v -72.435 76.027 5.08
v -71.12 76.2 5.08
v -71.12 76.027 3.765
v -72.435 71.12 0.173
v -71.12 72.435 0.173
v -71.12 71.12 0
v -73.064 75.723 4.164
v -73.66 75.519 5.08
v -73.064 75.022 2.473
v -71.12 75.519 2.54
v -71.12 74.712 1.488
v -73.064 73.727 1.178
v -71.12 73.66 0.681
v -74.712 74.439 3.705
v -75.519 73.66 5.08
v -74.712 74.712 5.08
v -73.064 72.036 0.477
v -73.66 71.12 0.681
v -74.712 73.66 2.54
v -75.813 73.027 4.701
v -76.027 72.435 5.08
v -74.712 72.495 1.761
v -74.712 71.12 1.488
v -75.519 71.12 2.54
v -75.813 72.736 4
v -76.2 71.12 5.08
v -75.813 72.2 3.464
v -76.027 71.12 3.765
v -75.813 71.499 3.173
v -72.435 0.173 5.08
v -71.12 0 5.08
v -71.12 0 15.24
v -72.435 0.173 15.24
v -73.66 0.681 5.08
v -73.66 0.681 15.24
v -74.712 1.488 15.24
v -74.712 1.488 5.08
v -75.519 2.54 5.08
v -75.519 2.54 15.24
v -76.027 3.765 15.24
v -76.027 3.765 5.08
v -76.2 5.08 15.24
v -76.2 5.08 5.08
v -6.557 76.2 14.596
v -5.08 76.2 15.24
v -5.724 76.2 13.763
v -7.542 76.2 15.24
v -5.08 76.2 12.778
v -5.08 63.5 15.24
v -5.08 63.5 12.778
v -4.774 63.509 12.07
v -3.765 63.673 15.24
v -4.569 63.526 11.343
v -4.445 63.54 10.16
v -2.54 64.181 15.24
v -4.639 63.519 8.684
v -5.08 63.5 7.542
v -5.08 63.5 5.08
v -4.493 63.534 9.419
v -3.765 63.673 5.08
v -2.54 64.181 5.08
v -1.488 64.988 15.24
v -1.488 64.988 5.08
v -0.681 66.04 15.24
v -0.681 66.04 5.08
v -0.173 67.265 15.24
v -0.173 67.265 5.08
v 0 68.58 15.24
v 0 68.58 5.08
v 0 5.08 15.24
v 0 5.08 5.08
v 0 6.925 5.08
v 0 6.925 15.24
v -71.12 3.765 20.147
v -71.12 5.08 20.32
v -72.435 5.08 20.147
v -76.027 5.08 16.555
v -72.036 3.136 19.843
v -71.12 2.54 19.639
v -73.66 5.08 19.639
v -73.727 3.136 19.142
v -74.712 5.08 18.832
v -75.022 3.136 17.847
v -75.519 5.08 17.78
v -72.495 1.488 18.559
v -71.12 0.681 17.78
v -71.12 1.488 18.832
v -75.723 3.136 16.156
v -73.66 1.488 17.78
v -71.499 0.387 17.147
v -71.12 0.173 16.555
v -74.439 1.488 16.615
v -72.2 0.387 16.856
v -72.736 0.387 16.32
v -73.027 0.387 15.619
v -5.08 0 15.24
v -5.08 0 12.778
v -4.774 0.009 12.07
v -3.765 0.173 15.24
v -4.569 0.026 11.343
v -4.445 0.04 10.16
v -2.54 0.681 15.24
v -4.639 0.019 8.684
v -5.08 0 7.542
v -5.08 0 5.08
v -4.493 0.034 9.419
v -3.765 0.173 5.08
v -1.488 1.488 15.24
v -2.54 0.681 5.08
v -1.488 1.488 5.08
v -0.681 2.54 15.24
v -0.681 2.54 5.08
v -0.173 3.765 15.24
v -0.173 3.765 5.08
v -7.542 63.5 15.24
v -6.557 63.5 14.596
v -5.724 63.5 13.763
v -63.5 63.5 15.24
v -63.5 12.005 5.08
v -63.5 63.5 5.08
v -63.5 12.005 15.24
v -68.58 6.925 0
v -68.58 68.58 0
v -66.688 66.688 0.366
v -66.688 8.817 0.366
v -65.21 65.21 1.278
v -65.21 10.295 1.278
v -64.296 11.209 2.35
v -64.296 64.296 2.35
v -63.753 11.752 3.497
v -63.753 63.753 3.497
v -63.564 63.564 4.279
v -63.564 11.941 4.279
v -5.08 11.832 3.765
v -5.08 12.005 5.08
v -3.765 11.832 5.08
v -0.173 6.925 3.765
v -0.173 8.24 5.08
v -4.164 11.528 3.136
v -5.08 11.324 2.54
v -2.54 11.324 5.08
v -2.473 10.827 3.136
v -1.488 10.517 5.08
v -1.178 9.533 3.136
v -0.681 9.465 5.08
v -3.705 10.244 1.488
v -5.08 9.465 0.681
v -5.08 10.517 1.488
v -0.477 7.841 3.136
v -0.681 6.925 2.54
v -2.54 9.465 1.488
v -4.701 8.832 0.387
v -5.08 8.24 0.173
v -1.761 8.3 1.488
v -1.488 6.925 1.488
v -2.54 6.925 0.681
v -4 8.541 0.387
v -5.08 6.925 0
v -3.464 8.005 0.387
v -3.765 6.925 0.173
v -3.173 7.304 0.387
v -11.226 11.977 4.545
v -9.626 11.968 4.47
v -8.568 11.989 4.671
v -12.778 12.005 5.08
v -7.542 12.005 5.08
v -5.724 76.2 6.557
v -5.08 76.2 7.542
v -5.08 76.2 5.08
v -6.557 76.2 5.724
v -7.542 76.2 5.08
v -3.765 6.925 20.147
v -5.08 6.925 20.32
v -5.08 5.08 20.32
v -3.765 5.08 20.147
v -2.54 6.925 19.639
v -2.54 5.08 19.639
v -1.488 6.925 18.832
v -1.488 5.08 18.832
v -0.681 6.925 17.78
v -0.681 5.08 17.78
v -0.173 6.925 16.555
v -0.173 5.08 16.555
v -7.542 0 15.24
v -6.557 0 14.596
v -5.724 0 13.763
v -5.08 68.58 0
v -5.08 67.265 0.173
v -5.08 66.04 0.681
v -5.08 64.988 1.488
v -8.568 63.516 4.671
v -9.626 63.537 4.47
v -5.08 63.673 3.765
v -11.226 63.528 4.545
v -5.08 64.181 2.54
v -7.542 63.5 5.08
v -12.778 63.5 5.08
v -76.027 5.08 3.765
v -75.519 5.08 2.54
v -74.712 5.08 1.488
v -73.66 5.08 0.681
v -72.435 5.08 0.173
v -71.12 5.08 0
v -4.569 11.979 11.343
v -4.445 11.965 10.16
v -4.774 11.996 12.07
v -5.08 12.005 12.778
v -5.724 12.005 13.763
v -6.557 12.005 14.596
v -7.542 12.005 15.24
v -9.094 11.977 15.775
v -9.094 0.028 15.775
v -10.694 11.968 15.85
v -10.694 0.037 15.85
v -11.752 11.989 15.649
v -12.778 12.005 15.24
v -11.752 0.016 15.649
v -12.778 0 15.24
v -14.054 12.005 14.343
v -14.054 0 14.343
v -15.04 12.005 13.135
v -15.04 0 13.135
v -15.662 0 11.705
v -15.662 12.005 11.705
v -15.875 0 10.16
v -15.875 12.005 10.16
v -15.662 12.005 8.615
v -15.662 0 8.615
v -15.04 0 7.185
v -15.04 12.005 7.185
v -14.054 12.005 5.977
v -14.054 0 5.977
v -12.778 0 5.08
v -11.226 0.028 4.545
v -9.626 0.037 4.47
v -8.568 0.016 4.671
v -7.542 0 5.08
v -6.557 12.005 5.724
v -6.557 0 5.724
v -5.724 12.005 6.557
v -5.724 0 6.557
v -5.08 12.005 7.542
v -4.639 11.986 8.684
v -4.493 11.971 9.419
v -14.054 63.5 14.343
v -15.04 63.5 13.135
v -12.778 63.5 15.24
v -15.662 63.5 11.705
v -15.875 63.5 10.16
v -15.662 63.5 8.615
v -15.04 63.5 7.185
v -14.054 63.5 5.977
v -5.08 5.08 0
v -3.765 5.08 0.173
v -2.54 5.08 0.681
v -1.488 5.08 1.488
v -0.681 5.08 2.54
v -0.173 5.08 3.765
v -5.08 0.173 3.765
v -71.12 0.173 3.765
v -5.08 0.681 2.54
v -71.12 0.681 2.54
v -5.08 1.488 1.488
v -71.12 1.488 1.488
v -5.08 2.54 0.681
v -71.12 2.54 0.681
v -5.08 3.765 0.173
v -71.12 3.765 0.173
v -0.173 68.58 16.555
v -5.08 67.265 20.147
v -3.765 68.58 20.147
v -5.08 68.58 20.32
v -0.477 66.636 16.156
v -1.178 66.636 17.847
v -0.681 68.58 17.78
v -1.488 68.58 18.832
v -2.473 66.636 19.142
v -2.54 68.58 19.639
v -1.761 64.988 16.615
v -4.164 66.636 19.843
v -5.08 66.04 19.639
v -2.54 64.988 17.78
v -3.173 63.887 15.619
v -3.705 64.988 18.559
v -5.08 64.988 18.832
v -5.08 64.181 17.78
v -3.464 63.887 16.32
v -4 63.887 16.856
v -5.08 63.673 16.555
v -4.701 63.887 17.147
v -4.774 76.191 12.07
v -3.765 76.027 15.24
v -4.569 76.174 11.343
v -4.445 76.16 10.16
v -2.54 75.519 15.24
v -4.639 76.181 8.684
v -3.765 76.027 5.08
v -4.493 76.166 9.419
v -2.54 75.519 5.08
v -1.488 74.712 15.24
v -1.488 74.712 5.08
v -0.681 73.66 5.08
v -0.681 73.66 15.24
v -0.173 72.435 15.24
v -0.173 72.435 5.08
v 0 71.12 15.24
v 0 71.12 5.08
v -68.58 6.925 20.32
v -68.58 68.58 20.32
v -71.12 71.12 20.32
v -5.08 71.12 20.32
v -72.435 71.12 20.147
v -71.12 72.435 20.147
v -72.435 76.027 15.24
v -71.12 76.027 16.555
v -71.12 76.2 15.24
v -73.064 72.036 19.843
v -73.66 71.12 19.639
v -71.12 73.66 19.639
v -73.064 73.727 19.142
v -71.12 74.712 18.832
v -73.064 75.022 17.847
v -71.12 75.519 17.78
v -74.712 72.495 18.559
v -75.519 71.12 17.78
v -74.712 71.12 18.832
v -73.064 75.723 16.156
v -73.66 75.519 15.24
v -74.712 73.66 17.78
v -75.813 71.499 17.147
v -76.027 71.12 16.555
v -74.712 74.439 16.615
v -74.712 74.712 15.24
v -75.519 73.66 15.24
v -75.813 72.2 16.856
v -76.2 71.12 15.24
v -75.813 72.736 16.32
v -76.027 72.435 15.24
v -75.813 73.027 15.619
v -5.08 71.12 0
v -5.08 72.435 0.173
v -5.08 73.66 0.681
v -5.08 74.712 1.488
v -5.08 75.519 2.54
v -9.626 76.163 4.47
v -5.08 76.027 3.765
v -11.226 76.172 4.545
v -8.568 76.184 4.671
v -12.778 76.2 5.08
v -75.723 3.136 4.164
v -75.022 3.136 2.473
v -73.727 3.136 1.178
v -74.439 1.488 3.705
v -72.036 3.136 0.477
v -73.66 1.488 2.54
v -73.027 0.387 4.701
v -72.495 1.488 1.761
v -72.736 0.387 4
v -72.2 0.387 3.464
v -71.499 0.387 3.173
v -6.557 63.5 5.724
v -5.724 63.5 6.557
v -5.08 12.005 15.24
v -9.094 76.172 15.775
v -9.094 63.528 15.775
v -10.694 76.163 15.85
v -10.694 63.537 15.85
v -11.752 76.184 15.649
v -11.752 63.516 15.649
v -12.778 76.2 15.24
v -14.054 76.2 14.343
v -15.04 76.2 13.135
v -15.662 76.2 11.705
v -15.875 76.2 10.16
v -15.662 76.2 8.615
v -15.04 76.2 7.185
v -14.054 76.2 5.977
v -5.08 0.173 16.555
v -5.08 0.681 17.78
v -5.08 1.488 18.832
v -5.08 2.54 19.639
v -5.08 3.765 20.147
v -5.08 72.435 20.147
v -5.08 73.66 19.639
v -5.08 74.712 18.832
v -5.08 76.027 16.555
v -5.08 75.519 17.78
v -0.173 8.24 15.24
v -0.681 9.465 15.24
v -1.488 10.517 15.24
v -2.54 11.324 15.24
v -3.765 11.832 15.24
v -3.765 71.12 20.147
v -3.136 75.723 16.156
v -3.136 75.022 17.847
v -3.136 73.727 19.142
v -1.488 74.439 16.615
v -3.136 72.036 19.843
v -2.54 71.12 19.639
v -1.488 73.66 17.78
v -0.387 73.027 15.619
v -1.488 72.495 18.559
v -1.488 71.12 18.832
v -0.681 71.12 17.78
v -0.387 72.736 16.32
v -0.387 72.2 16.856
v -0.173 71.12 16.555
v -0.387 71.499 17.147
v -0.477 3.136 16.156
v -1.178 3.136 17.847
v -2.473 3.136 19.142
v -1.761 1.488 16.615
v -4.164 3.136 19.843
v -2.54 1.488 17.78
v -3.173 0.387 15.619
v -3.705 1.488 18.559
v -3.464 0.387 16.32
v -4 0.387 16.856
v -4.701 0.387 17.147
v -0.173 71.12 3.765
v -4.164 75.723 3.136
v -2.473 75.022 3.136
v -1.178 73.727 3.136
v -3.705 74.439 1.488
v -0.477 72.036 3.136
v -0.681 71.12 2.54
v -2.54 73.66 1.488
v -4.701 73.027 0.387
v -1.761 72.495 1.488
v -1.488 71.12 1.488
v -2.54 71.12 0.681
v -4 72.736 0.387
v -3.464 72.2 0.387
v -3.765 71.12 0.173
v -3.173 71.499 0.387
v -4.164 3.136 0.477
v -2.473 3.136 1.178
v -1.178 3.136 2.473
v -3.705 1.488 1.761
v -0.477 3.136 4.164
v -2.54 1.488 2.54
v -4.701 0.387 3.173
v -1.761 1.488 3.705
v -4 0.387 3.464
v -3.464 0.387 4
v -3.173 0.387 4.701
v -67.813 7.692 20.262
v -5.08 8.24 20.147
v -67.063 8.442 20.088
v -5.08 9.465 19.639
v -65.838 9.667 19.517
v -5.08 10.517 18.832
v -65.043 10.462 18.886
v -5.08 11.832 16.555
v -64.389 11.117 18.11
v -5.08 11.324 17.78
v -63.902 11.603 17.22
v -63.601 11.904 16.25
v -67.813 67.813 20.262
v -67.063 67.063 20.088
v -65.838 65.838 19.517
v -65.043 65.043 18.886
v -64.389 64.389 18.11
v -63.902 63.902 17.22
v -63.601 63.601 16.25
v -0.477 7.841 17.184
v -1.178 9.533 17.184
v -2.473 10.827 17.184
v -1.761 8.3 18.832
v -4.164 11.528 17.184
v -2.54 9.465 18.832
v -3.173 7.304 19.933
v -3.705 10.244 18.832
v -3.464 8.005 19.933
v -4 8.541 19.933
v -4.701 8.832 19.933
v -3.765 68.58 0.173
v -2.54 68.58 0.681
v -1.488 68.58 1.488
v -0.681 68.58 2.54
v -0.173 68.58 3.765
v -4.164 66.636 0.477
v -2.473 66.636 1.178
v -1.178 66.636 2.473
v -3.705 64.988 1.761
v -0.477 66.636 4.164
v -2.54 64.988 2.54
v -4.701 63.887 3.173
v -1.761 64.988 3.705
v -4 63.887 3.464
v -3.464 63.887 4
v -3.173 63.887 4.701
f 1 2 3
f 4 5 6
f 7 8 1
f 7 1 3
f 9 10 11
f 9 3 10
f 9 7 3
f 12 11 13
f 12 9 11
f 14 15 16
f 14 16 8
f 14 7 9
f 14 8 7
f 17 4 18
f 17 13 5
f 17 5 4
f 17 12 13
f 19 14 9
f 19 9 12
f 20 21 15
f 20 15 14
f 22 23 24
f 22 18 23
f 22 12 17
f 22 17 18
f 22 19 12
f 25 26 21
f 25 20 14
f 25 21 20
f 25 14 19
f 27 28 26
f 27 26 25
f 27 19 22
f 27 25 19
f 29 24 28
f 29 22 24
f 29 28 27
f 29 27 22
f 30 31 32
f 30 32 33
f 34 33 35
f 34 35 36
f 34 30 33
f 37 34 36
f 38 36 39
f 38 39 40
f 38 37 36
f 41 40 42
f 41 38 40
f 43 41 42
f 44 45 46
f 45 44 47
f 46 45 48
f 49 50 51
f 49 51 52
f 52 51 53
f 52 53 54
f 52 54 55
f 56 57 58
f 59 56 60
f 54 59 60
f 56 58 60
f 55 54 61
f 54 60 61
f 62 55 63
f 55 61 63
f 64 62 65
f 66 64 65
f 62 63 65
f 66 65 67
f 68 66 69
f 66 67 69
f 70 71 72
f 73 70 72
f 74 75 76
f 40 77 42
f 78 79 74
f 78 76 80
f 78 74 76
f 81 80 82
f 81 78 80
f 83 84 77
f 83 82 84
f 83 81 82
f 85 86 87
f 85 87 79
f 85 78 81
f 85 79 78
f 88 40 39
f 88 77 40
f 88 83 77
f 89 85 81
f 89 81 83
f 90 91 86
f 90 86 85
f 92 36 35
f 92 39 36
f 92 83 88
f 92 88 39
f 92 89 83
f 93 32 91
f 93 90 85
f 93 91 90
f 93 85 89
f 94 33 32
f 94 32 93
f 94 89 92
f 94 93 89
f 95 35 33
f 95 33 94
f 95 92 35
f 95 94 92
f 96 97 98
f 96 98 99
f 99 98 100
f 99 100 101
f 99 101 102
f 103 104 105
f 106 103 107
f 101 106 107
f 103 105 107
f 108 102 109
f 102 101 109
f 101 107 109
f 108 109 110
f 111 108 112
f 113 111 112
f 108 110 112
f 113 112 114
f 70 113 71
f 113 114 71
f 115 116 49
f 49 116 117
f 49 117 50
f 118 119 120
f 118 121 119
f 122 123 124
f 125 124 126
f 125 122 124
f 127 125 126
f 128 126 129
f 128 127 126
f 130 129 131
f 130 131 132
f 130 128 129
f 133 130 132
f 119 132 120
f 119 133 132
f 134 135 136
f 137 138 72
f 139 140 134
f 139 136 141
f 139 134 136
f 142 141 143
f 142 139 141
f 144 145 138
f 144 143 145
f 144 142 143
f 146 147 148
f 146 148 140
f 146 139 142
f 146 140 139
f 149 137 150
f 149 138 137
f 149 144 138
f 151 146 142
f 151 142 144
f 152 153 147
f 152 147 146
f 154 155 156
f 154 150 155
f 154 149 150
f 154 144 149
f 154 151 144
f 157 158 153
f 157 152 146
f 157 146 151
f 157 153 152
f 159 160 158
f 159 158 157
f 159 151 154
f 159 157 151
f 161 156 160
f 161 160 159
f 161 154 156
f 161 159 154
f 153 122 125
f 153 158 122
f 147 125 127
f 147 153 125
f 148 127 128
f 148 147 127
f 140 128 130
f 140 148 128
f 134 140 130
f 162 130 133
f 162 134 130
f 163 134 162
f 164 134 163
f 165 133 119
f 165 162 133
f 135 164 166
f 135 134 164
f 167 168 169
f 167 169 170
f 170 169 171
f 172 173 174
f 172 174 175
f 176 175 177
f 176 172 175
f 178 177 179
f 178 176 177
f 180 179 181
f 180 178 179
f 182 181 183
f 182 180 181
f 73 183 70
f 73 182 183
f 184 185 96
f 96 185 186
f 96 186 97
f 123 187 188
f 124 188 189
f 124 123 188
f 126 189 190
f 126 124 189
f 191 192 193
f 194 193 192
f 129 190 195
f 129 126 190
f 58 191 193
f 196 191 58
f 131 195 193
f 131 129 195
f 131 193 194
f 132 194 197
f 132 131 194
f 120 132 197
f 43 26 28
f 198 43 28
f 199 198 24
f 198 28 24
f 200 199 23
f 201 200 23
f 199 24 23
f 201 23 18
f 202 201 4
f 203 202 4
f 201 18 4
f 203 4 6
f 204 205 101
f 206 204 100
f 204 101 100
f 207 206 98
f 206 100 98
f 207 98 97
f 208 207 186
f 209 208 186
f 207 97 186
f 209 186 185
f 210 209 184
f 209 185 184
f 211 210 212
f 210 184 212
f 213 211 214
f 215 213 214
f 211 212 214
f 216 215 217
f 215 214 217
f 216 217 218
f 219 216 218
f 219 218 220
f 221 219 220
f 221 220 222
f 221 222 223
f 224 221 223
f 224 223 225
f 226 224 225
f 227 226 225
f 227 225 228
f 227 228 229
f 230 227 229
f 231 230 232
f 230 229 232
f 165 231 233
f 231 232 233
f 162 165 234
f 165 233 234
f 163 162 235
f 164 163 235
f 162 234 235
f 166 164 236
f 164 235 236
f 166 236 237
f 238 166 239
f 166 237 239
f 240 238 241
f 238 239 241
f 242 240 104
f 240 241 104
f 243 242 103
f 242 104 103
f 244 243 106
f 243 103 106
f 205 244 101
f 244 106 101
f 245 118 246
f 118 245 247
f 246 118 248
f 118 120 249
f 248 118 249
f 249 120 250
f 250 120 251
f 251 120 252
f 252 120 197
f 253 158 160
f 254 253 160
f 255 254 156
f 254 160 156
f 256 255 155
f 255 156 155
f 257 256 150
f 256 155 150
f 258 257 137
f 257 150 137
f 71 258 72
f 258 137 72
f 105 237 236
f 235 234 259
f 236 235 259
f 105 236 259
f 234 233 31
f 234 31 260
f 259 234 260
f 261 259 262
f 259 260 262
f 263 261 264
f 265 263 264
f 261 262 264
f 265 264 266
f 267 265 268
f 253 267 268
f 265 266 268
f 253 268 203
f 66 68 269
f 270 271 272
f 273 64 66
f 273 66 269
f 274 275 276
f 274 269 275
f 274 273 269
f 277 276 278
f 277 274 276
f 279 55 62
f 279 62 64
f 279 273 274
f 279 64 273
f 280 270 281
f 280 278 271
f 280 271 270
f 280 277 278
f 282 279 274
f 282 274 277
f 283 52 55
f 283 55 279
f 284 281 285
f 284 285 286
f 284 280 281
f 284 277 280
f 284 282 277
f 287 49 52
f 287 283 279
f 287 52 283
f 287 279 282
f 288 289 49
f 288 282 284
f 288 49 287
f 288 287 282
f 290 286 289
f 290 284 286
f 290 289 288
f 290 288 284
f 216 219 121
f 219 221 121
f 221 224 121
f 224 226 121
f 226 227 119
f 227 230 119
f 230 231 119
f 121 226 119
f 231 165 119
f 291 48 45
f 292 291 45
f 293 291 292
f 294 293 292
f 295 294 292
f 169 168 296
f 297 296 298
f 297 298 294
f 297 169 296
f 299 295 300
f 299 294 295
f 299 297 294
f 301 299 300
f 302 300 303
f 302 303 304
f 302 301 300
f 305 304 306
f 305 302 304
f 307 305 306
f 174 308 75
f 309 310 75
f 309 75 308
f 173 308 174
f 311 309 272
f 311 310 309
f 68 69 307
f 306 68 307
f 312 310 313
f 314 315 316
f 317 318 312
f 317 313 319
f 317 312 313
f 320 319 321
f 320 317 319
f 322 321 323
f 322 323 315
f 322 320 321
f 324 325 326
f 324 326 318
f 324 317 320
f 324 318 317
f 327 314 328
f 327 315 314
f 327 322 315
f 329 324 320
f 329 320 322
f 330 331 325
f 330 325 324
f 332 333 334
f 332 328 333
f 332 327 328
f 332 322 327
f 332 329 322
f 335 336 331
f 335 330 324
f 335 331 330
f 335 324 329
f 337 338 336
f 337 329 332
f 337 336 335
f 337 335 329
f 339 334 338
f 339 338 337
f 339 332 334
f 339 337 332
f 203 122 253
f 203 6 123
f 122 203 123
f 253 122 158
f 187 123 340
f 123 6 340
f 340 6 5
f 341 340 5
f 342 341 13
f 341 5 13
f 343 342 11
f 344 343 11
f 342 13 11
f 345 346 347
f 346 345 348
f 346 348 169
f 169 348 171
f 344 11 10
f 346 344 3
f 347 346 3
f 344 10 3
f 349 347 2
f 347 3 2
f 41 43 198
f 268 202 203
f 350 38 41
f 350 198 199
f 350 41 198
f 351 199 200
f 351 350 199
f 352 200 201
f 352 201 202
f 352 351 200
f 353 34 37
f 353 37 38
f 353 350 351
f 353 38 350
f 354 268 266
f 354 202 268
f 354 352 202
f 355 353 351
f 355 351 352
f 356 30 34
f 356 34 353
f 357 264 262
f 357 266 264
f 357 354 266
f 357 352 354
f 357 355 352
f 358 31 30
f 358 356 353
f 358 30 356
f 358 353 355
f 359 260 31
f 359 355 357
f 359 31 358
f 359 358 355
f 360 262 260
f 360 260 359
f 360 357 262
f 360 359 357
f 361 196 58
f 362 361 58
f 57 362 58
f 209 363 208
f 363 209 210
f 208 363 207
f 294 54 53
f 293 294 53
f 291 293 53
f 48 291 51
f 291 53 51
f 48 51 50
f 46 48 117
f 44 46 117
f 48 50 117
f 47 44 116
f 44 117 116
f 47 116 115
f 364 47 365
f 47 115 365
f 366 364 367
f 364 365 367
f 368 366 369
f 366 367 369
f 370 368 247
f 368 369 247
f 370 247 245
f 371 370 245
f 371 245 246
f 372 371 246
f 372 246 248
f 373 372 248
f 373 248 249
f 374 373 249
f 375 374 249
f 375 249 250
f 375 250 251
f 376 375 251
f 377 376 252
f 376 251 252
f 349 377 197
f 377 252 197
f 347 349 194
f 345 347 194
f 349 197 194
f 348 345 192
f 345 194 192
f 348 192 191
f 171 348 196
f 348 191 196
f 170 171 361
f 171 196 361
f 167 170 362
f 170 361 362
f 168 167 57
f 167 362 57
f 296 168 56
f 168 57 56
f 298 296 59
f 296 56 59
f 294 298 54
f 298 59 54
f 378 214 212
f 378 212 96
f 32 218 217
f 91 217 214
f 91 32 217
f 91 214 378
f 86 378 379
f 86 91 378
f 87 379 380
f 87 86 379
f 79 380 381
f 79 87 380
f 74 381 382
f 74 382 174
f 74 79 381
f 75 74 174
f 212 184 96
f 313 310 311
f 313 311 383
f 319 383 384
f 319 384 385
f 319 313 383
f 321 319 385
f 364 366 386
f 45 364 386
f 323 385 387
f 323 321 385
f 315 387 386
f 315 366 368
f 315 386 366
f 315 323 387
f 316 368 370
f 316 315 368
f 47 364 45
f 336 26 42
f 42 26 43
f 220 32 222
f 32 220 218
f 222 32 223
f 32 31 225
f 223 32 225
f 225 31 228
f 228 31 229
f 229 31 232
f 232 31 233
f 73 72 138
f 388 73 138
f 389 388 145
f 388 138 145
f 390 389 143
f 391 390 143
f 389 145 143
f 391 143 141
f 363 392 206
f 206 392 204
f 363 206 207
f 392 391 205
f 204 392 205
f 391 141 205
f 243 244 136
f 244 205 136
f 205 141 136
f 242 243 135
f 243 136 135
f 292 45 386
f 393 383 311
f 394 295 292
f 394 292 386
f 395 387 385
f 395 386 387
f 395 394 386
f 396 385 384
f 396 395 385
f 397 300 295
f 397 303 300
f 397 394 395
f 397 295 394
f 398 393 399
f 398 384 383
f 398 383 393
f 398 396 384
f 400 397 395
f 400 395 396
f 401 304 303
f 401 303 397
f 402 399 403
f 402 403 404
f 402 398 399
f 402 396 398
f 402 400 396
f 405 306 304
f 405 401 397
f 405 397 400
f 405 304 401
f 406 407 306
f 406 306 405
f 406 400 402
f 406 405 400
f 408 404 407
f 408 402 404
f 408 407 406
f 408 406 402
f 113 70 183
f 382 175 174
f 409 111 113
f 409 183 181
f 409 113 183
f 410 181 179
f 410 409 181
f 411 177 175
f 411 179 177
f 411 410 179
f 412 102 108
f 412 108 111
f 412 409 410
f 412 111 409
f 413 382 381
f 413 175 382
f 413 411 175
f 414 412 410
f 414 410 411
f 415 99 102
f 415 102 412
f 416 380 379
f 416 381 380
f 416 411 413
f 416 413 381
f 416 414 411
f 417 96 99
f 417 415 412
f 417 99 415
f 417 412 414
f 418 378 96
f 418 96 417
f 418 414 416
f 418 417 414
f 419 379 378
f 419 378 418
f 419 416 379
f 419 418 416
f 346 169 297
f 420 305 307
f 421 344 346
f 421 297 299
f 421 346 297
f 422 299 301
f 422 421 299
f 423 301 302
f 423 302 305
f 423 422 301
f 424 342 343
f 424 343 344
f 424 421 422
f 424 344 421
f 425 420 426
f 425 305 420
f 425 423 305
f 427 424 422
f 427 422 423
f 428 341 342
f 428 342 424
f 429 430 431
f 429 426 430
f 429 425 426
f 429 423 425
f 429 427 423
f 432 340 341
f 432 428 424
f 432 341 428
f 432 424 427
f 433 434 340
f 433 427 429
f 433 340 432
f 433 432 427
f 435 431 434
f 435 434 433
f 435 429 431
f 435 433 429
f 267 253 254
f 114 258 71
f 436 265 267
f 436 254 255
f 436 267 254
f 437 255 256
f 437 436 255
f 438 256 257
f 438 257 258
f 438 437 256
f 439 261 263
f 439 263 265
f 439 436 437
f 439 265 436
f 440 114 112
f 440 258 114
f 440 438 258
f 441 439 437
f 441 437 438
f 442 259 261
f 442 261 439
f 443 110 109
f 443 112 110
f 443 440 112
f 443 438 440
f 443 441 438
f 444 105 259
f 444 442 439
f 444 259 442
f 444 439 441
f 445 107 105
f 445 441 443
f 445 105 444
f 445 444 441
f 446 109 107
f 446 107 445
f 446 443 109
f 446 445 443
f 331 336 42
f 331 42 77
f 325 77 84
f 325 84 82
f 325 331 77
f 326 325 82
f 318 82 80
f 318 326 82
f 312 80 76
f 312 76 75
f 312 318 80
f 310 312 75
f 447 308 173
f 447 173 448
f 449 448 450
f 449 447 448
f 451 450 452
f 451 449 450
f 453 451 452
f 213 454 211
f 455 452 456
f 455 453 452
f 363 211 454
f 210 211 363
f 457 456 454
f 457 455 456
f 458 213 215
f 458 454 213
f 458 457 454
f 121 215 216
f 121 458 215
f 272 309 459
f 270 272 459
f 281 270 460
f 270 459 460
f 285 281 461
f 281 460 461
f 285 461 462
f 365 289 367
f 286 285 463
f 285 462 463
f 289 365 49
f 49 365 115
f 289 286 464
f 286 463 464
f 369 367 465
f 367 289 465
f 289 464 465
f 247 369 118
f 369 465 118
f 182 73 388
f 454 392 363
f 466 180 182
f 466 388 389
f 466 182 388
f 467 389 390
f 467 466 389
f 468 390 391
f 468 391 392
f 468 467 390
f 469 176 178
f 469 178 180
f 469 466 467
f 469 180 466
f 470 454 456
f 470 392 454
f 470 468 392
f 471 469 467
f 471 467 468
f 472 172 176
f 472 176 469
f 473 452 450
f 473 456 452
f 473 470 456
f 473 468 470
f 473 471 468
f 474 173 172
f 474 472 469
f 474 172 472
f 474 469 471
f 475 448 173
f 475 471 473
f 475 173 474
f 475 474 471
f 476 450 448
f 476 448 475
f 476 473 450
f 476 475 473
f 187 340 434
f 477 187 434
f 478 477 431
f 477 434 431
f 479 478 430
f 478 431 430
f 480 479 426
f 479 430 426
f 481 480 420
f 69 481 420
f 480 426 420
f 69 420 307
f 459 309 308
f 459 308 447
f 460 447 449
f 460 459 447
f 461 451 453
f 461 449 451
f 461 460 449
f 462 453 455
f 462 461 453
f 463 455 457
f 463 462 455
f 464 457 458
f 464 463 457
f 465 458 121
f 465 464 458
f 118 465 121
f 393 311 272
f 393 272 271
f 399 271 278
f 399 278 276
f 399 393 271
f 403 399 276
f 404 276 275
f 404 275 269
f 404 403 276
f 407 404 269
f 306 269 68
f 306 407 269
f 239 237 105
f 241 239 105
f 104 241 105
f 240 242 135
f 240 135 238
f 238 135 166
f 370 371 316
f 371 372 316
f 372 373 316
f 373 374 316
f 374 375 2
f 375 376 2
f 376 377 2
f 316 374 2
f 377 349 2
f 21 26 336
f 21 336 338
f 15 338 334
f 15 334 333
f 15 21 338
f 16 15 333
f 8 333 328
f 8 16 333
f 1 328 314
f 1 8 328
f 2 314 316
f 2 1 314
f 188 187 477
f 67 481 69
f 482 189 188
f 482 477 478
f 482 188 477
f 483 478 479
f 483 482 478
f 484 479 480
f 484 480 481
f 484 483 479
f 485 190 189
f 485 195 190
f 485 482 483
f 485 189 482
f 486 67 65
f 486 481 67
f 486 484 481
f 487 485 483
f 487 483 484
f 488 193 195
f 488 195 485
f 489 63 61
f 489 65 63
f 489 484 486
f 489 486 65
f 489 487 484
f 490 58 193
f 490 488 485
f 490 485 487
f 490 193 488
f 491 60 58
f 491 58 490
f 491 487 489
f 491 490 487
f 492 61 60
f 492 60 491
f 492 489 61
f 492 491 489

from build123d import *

# Parameters (mm, degrees)
F1_DEPTH      = 20.32
F2_R          = 5.715
F3_DEPTH      = 863.6
F4_T1_DEPTH   = 66.04
F4_T3_DEPTH   = 58.42
F4_T5_DEPTH   = 51.4949167535
F4_T7_DEPTH   = 66.04
F4_T9_DEPTH   = 10.16
F4_T11_DEPTH  = 2.54
F4_T13_DEPTH  = 1.8450832465
F4_S17_W      = 5.08
F4_S17_H      = 5.08
F4_T18_DEPTH  = 5.08
F4_S23_W      = 5.08
F4_S23_H      = 5.08
F4_T24_DEPTH  = 5.08
F4_S29_W      = 5.08
F4_S29_H      = 5.08
F4_T30_DEPTH  = 5.08
F4_S35_W      = 5.08
F4_S35_H      = 5.08
F4_T36_DEPTH  = 5.08
F4_S41_W      = 5.08
F4_S41_H      = 5.08
F4_T42_DEPTH  = 5.08
F4_S47_W      = 5.08
F4_S47_H      = 5.08
F4_T48_DEPTH  = 5.08
F4_S53_W      = 5.08
F4_S53_H      = 5.08
F4_T54_DEPTH  = 5.08
F4_S59_W      = 5.08
F4_S59_H      = 5.08
F4_T60_DEPTH  = 5.08
F4_S65_W      = 5.08
F4_S65_H      = 5.08
F4_T66_DEPTH  = 5.08
F4_S71_W      = 5.08
F4_S71_H      = 5.08
F4_T72_DEPTH  = 5.08
F4_S77_W      = 5.08
F4_S77_H      = 5.08
F4_T78_DEPTH  = 5.08
F4_S83_W      = 5.08
F4_S83_H      = 5.08
F4_T84_DEPTH  = 5.08
F4_T91_DEPTH  = 64.1949167535
F4_T95_DEPTH  = 71.12
F4_T102_DEPTH = 64.1949167535
F4_T106_DEPTH = 71.12
F4_T113_DEPTH = 71.12
F4_T117_DEPTH = 64.1949167535
F4_T124_DEPTH = 71.12
F4_T128_DEPTH = 64.1949167535


# Not quite as in the source:
# - a fillet or chamfer that OpenCascade refuses, or shapes differently, is made with other operations: its cross-section is extruded or revolved along the edge and cut away or added


with BuildPart() as f1:
    # F0 (on Top) → F1 (new body)
    with BuildSketch(Plane.XY):
        Polygon((-76.2, 0), (0, 0), (0, 12.0050832465), (-63.5, 12.0050832465), (-63.5, 63.5), (0, 63.5), (0, 76.2), (-76.2, 76.2), align=None)
    extrude(amount=F1_DEPTH)

    # F2 (on face) → F3 (cut)
    with BuildSketch(Plane.XZ):
        with Locations((-10.16, 10.16)):
            Circle(F2_R)
    extrude(amount=-F3_DEPTH, mode=Mode.SUBTRACT)

    # F4: fillet of radius 5.08 on 22 edges, made by hand

    # F4_s2 → F4_t1 (cut)
    with BuildSketch(Plane.YZ.offset(-71.12)):
        with BuildLine():
            ThreePointArc((71.12, 0), (74.7121024484, 1.4878975516), (76.2, 5.08))
            Line((76.2, 5.08), (76.2, 0))
            Line((76.2, 0), (71.12, 0))
        make_face()
        with BuildLine():
            ThreePointArc((71.12, 20.32), (74.7121024484, 18.8321024484), (76.2, 15.24))
            Line((76.2, 15.24), (76.2, 20.32))
            Line((76.2, 20.32), (71.12, 20.32))
        make_face()
        with BuildLine():
            ThreePointArc((0, 5.08), (1.4878975516, 1.4878975516), (5.08, 0))
            Line((5.08, 0), (0, 0))
            Line((0, 0), (0, 5.08))
        make_face()
        with BuildLine():
            ThreePointArc((0, 15.24), (1.4878975516, 18.8321024484), (5.08, 20.32))
            Line((5.08, 20.32), (0, 20.32))
            Line((0, 20.32), (0, 15.24))
        make_face()
    extrude(amount=F4_T1_DEPTH, mode=Mode.SUBTRACT)

    # F4_s4 → F4_t3 (cut)
    with BuildSketch(Plane.YZ.offset(-63.5)):
        with BuildLine():
            ThreePointArc((68.58, 0), (64.9878975516, 1.4878975516), (63.5, 5.08))
            Line((63.5, 5.08), (63.5, 0))
            Line((63.5, 0), (68.58, 0))
        make_face()
        with BuildLine():
            ThreePointArc((68.58, 20.32), (64.9878975516, 18.8321024484), (63.5, 15.24))
            Line((63.5, 15.24), (63.5, 20.32))
            Line((63.5, 20.32), (68.58, 20.32))
        make_face()
        with BuildLine():
            ThreePointArc((6.9250832465, 0), (10.5171856949, 1.4878975516), (12.0050832465, 5.08))
            Line((12.0050832465, 5.08), (12.0050832465, 0))
            Line((12.0050832465, 0), (6.9250832465, 0))
        make_face()
        with BuildLine():
            ThreePointArc((6.9250832465, 20.32), (10.5171856949, 18.8321024484), (12.0050832465, 15.24))
            Line((12.0050832465, 15.24), (12.0050832465, 20.32))
            Line((12.0050832465, 20.32), (6.9250832465, 20.32))
        make_face()
    extrude(amount=F4_T3_DEPTH, mode=Mode.SUBTRACT)

    # F4_s6 → F4_t5 (cut)
    with BuildSketch(Plane.XZ.offset(-63.5)):
        with BuildLine():
            ThreePointArc((-68.58, 20.32), (-64.9878975516, 18.8321024484), (-63.5, 15.24))
            Line((-63.5, 15.24), (-63.5, 20.32))
            Line((-63.5, 20.32), (-68.58, 20.32))
        make_face()
        with BuildLine():
            ThreePointArc((-68.58, 0), (-64.9878975516, 1.4878975516), (-63.5, 5.08))
            Line((-63.5, 5.08), (-63.5, 0))
            Line((-63.5, 0), (-68.58, 0))
        make_face()
    extrude(amount=F4_T5_DEPTH, mode=Mode.SUBTRACT)

    # F4_s8 → F4_t7 (cut)
    with BuildSketch(Plane.XZ.offset(-71.12)):
        with BuildLine():
            ThreePointArc((-76.2, 15.24), (-74.7121024484, 18.8321024484), (-71.12, 20.32))
            Line((-71.12, 20.32), (-76.2, 20.32))
            Line((-76.2, 20.32), (-76.2, 15.24))
        make_face()
        with BuildLine():
            ThreePointArc((-76.2, 5.08), (-74.7121024484, 1.4878975516), (-71.12, 0))
            Line((-71.12, 0), (-76.2, 0))
            Line((-76.2, 0), (-76.2, 5.08))
        make_face()
    extrude(amount=F4_T7_DEPTH, mode=Mode.SUBTRACT)

    # F4_s10 → F4_t9 (cut)
    with BuildSketch(Plane.XY.offset(5.08)):
        with BuildLine():
            ThreePointArc((-76.2, 71.12), (-74.7121024484, 74.7121024484), (-71.12, 76.2))
            Line((-71.12, 76.2), (-76.2, 76.2))
            Line((-76.2, 76.2), (-76.2, 71.12))
        make_face()
        with BuildLine():
            ThreePointArc((-71.12, 0), (-74.7121024484, 1.4878975516), (-76.2, 5.08))
            Line((-76.2, 5.08), (-76.2, 0))
            Line((-76.2, 0), (-71.12, 0))
        make_face()
        with BuildLine():
            ThreePointArc((-5.08, 63.5), (-1.4878975516, 64.9878975516), (0, 68.58))
            Line((0, 68.58), (0, 63.5))
            Line((0, 63.5), (-5.08, 63.5))
        make_face()
        with BuildLine():
            ThreePointArc((-5.08, 76.2), (-1.4878975516, 74.7121024484), (0, 71.12))
            Line((0, 71.12), (0, 76.2))
            Line((0, 76.2), (-5.08, 76.2))
        make_face()
        with BuildLine():
            ThreePointArc((-5.08, 0), (-1.4878975516, 1.4878975516), (0, 5.08))
            Line((0, 5.08), (0, 0))
            Line((0, 0), (-5.08, 0))
        make_face()
        with BuildLine():
            ThreePointArc((0, 6.9250832465), (-1.4878975516, 10.5171856949), (-5.08, 12.0050832465))
            Line((-5.08, 12.0050832465), (0, 12.0050832465))
            Line((0, 12.0050832465), (0, 6.9250832465))
        make_face()
    extrude(amount=F4_T9_DEPTH, mode=Mode.SUBTRACT)

    # F4_s12 → F4_t11 (cut)
    with BuildSketch(Plane.XZ.offset(-71.12)):
        with BuildLine():
            ThreePointArc((-5.08, 0), (-1.4878975516, 1.4878975516), (0, 5.08))
            Line((0, 5.08), (0, 0))
            Line((0, 0), (-5.08, 0))
        make_face()
        with BuildLine():
            ThreePointArc((-5.08, 20.32), (-1.4878975516, 18.8321024484), (0, 15.24))
            Line((0, 15.24), (0, 20.32))
            Line((0, 20.32), (-5.08, 20.32))
        make_face()
    extrude(amount=F4_T11_DEPTH, mode=Mode.SUBTRACT)

    # F4_s14 → F4_t13 (cut)
    with BuildSketch(Plane.XZ.offset(-6.9250832465)):
        with BuildLine():
            ThreePointArc((-5.08, 0), (-1.4878975516, 1.4878975516), (0, 5.08))
            Line((0, 5.08), (0, 0))
            Line((0, 0), (-5.08, 0))
        make_face()
        with BuildLine():
            ThreePointArc((-5.08, 20.32), (-1.4878975516, 18.8321024484), (0, 15.24))
            Line((0, 15.24), (0, 20.32))
            Line((0, 20.32), (-5.08, 20.32))
        make_face()
    extrude(amount=F4_T13_DEPTH, mode=Mode.SUBTRACT)


with BuildPart() as f4_tool16:
    # F4_s17 → F4_t18 (new body)
    with BuildSketch(Plane.XY.offset(5.08)):
        with Locations((-2.54, 73.66)):
            Rectangle(F4_S17_W, F4_S17_H)
    extrude(amount=-F4_T18_DEPTH)

    # F4_s19 → F4_t20 (revolve, cut)
    with BuildSketch(Plane(origin=(-5.08, 71.12, 5.08), x_dir=(-0.7071067812, -0.7071067812, 0), z_dir=(0.7071067812, -0.7071067812, 0))):
        with BuildLine():
            ThreePointArc((0, -5.08), (5.08, 0), (0, 5.08))
            Line((0, 5.08), (0, -5.08))
        make_face()
    revolve(axis=Axis((-5.08, 71.12, 5.08), (0, 0, -1)), mode=Mode.SUBTRACT)


with BuildPart() as f1_1:
    add(f1.part)

    # F4_t15: cut F4_tool16
    add(f4_tool16.part, mode=Mode.SUBTRACT)


with BuildPart() as f4_tool22:
    # F4_s23 → F4_t24 (new body)
    with BuildSketch(Plane.YZ.offset(-71.12)):
        with Locations((73.66, 2.54)):
            Rectangle(F4_S23_W, F4_S23_H)
    extrude(amount=-F4_T24_DEPTH)

    # F4_s25 → F4_t26 (revolve, cut)
    with BuildSketch(Plane(origin=(-71.12, 71.12, 5.08), x_dir=(0, -0.7071067812, 0.7071067812), z_dir=(0, -0.7071067812, -0.7071067812))):
        with BuildLine():
            ThreePointArc((0, -5.08), (5.08, 0), (0, 5.08))
            Line((0, 5.08), (0, -5.08))
        make_face()
    revolve(axis=Axis((-71.12, 71.12, 5.08), (-1, 0, 0)), mode=Mode.SUBTRACT)


with BuildPart() as f1_2:
    add(f1_1.part)

    # F4_t21: cut F4_tool22
    add(f4_tool22.part, mode=Mode.SUBTRACT)


with BuildPart() as f4_tool28:
    # F4_s29 → F4_t30 (new body)
    with BuildSketch(Plane.XZ.offset(-68.58)):
        with Locations((-2.54, 2.54)):
            Rectangle(F4_S29_W, F4_S29_H)
    extrude(amount=F4_T30_DEPTH)

    # F4_s31 → F4_t32 (revolve, cut)
    with BuildSketch(Plane(origin=(-5.08, 68.58, 5.08), x_dir=(-0.7071067812, 0, 0.7071067812), z_dir=(0.7071067812, 0, 0.7071067812))):
        with BuildLine():
            ThreePointArc((0, -5.08), (5.08, 0), (0, 5.08))
            Line((0, 5.08), (0, -5.08))
        make_face()
    revolve(axis=Axis((-5.08, 68.58, 5.08), (0, -1, 0)), mode=Mode.SUBTRACT)


with BuildPart() as f1_3:
    add(f1_2.part)

    # F4_t27: cut F4_tool28
    add(f4_tool28.part, mode=Mode.SUBTRACT)


with BuildPart() as f4_tool34:
    # F4_s35 → F4_t36 (new body)
    with BuildSketch(Plane.XZ.offset(-68.58)):
        with Locations((-2.54, 17.78)):
            Rectangle(F4_S35_W, F4_S35_H)
    extrude(amount=F4_T36_DEPTH)

    # F4_s37 → F4_t38 (revolve, cut)
    with BuildSketch(Plane(origin=(-5.08, 68.58, 15.24), x_dir=(-0.7071067812, 0, -0.7071067812), z_dir=(-0.7071067812, 0, 0.7071067812))):
        with BuildLine():
            ThreePointArc((0, -5.08), (5.08, 0), (0, 5.08))
            Line((0, 5.08), (0, -5.08))
        make_face()
    revolve(axis=Axis((-5.08, 68.58, 15.24), (0, -1, 0)), mode=Mode.SUBTRACT)


with BuildPart() as f1_4:
    add(f1_3.part)

    # F4_t33: cut F4_tool34
    add(f4_tool34.part, mode=Mode.SUBTRACT)


with BuildPart() as f4_tool40:
    # F4_s41 → F4_t42 (new body)
    with BuildSketch(Plane.YZ.offset(-5.08)):
        with Locations((73.66, 17.78)):
            Rectangle(F4_S41_W, F4_S41_H)
    extrude(amount=F4_T42_DEPTH)

    # F4_s43 → F4_t44 (revolve, cut)
    with BuildSketch(Plane(origin=(-5.08, 71.12, 15.24), x_dir=(0, -0.7071067812, -0.7071067812), z_dir=(0, -0.7071067812, 0.7071067812))):
        with BuildLine():
            ThreePointArc((0, -5.08), (5.08, 0), (0, 5.08))
            Line((0, 5.08), (0, -5.08))
        make_face()
    revolve(axis=Axis((-5.08, 71.12, 15.24), (1, 0, 0)), mode=Mode.SUBTRACT)


with BuildPart() as f1_5:
    add(f1_4.part)

    # F4_t39: cut F4_tool40
    add(f4_tool40.part, mode=Mode.SUBTRACT)


with BuildPart() as f4_tool46:
    # F4_s47 → F4_t48 (new body)
    with BuildSketch(Plane.YZ.offset(-71.12)):
        with Locations((73.66, 17.78)):
            Rectangle(F4_S47_W, F4_S47_H)
    extrude(amount=-F4_T48_DEPTH)

    # F4_s49 → F4_t50 (revolve, cut)
    with BuildSketch(Plane(origin=(-71.12, 71.12, 15.24), x_dir=(0, -0.7071067812, -0.7071067812), z_dir=(0, 0.7071067812, -0.7071067812))):
        with BuildLine():
            ThreePointArc((0, -5.08), (5.08, 0), (0, 5.08))
            Line((0, 5.08), (0, -5.08))
        make_face()
    revolve(axis=Axis((-71.12, 71.12, 15.24), (-1, 0, 0)), mode=Mode.SUBTRACT)


with BuildPart() as f1_6:
    add(f1_5.part)

    # F4_t45: cut F4_tool46
    add(f4_tool46.part, mode=Mode.SUBTRACT)


with BuildPart() as f4_tool52:
    # F4_s53 → F4_t54 (new body)
    with BuildSketch(Plane.XZ.offset(-5.08)):
        with Locations((-73.66, 17.78)):
            Rectangle(F4_S53_W, F4_S53_H)
    extrude(amount=F4_T54_DEPTH)

    # F4_s55 → F4_t56 (revolve, cut)
    with BuildSketch(Plane(origin=(-71.12, 5.08, 15.24), x_dir=(0.7071067812, 0, -0.7071067812), z_dir=(-0.7071067812, 0, -0.7071067812))):
        with BuildLine():
            ThreePointArc((0, -5.08), (5.08, 0), (0, 5.08))
            Line((0, 5.08), (0, -5.08))
        make_face()
    revolve(axis=Axis((-71.12, 5.08, 15.24), (0, -1, 0)), mode=Mode.SUBTRACT)


with BuildPart() as f1_7:
    add(f1_6.part)

    # F4_t51: cut F4_tool52
    add(f4_tool52.part, mode=Mode.SUBTRACT)


with BuildPart() as f4_tool58:
    # F4_s59 → F4_t60 (new body)
    with BuildSketch(Plane.XZ.offset(-5.08)):
        with Locations((-73.66, 2.54)):
            Rectangle(F4_S59_W, F4_S59_H)
    extrude(amount=F4_T60_DEPTH)

    # F4_s61 → F4_t62 (revolve, cut)
    with BuildSketch(Plane(origin=(-71.12, 5.08, 5.08), x_dir=(0.7071067812, 0, 0.7071067812), z_dir=(0.7071067812, 0, -0.7071067812))):
        with BuildLine():
            ThreePointArc((0, -5.08), (5.08, 0), (0, 5.08))
            Line((0, 5.08), (0, -5.08))
        make_face()
    revolve(axis=Axis((-71.12, 5.08, 5.08), (0, -1, 0)), mode=Mode.SUBTRACT)


with BuildPart() as f1_8:
    add(f1_7.part)

    # F4_t57: cut F4_tool58
    add(f4_tool58.part, mode=Mode.SUBTRACT)


with BuildPart() as f4_tool64:
    # F4_s65 → F4_t66 (new body)
    with BuildSketch(Plane.XZ.offset(-5.08)):
        with Locations((-2.54, 2.54)):
            Rectangle(F4_S65_W, F4_S65_H)
    extrude(amount=F4_T66_DEPTH)

    # F4_s67 → F4_t68 (revolve, cut)
    with BuildSketch(Plane(origin=(-5.08, 5.08, 5.08), x_dir=(-0.7071067812, 0, 0.7071067812), z_dir=(0.7071067812, 0, 0.7071067812))):
        with BuildLine():
            ThreePointArc((0, -5.08), (5.08, 0), (0, 5.08))
            Line((0, 5.08), (0, -5.08))
        make_face()
    revolve(axis=Axis((-5.08, 5.08, 5.08), (0, -1, 0)), mode=Mode.SUBTRACT)


with BuildPart() as f1_9:
    add(f1_8.part)

    # F4_t63: cut F4_tool64
    add(f4_tool64.part, mode=Mode.SUBTRACT)


with BuildPart() as f4_tool70:
    # F4_s71 → F4_t72 (new body)
    with BuildSketch(Plane.XZ.offset(-5.08)):
        with Locations((-2.54, 17.78)):
            Rectangle(F4_S71_W, F4_S71_H)
    extrude(amount=F4_T72_DEPTH)

    # F4_s73 → F4_t74 (revolve, cut)
    with BuildSketch(Plane(origin=(-5.08, 5.08, 15.24), x_dir=(-0.7071067812, 0, -0.7071067812), z_dir=(-0.7071067812, 0, 0.7071067812))):
        with BuildLine():
            ThreePointArc((0, -5.08), (5.08, 0), (0, 5.08))
            Line((0, 5.08), (0, -5.08))
        make_face()
    revolve(axis=Axis((-5.08, 5.08, 15.24), (0, -1, 0)), mode=Mode.SUBTRACT)


with BuildPart() as f1_10:
    add(f1_9.part)

    # F4_t69: cut F4_tool70
    add(f4_tool70.part, mode=Mode.SUBTRACT)


with BuildPart() as f4_tool76:
    # F4_s77 → F4_t78 (new body)
    with BuildSketch(Plane.XY.offset(5.08)):
        with Locations((-2.54, 9.4650832465)):
            Rectangle(F4_S77_W, F4_S77_H)
    extrude(amount=-F4_T78_DEPTH)

    # F4_s79 → F4_t80 (revolve, cut)
    with BuildSketch(Plane(origin=(-5.08, 6.9250832465, 5.08), x_dir=(-0.7071067812, -0.7071067812, 0), z_dir=(0.7071067812, -0.7071067812, 0))):
        with BuildLine():
            ThreePointArc((0, -5.08), (5.08, 0), (0, 5.08))
            Line((0, 5.08), (0, -5.08))
        make_face()
    revolve(axis=Axis((-5.08, 6.9250832465, 5.08), (0, 0, -1)), mode=Mode.SUBTRACT)


with BuildPart() as f1_11:
    add(f1_10.part)

    # F4_t75: cut F4_tool76
    add(f4_tool76.part, mode=Mode.SUBTRACT)


with BuildPart() as f4_tool82:
    # F4_s83 → F4_t84 (new body)
    with BuildSketch(Plane.XY.offset(15.24)):
        with Locations((-2.54, 9.4650832465)):
            Rectangle(F4_S83_W, F4_S83_H)
    extrude(amount=F4_T84_DEPTH)

    # F4_s85 → F4_t86 (revolve, cut)
    with BuildSketch(Plane(origin=(-5.08, 6.9250832465, 15.24), x_dir=(-0.7071067812, -0.7071067812, 0), z_dir=(-0.7071067812, 0.7071067812, 0))):
        with BuildLine():
            ThreePointArc((0, -5.08), (5.08, 0), (0, 5.08))
            Line((0, 5.08), (0, -5.08))
        make_face()
    revolve(axis=Axis((-5.08, 6.9250832465, 15.24), (0, 0, 1)), mode=Mode.SUBTRACT)


with BuildPart() as f1_12:
    add(f1_11.part)

    # F4_t81: cut F4_tool82
    add(f4_tool82.part, mode=Mode.SUBTRACT)


with BuildPart() as f4_tool89:
    # F4_s90 → F4_t91 (new body)
    with BuildSketch(Plane.XZ.offset(-12.0050832465)):
        with BuildLine():
            ThreePointArc((-68.58, 0), (-64.9878975516, 1.4878975516), (-63.5, 5.08))
            Line((-63.5, 5.08), (-63.5, 0))
            Line((-63.5, 0), (-68.58, 0))
        make_face()
    extrude(amount=-F4_T91_DEPTH)

    split(bisect_by=Plane.XZ.offset(-63.5), keep=Keep.BOTTOM)


with BuildPart() as f4_tool93:
    # F4_s94 → F4_t95 (new body)
    with BuildSketch(Plane.YZ.offset(-76.2)):
        with BuildLine():
            ThreePointArc((68.58, 0), (64.9878975516, 1.4878975516), (63.5, 5.08))
            Line((63.5, 5.08), (63.5, 0))
            Line((63.5, 0), (68.58, 0))
        make_face()
    extrude(amount=F4_T95_DEPTH)

    split(bisect_by=Plane.YZ.offset(-63.5), keep=Keep.BOTTOM)


with BuildPart() as f4_tool89_1:
    add(f4_tool89.part)

    # F4_t97: intersect F4_tool93
    add(f4_tool93.part, mode=Mode.INTERSECT)


with BuildPart() as f1_13:
    add(f1_12.part)

    # F4_t87: cut F4_tool89
    add(f4_tool89_1.part, mode=Mode.SUBTRACT)


with BuildPart() as f4_tool100:
    # F4_s101 → F4_t102 (new body)
    with BuildSketch(Plane.XZ.offset(-12.0050832465)):
        with BuildLine():
            ThreePointArc((-68.58, 20.32), (-64.9878975516, 18.8321024484), (-63.5, 15.24))
            Line((-63.5, 15.24), (-63.5, 20.32))
            Line((-63.5, 20.32), (-68.58, 20.32))
        make_face()
    extrude(amount=-F4_T102_DEPTH)

    split(bisect_by=Plane.XZ.offset(-63.5), keep=Keep.BOTTOM)


with BuildPart() as f4_tool104:
    # F4_s105 → F4_t106 (new body)
    with BuildSketch(Plane.YZ.offset(-76.2)):
        with BuildLine():
            ThreePointArc((68.58, 20.32), (64.9878975516, 18.8321024484), (63.5, 15.24))
            Line((63.5, 15.24), (63.5, 20.32))
            Line((63.5, 20.32), (68.58, 20.32))
        make_face()
    extrude(amount=F4_T106_DEPTH)

    split(bisect_by=Plane.YZ.offset(-63.5), keep=Keep.BOTTOM)


with BuildPart() as f4_tool100_1:
    add(f4_tool100.part)

    # F4_t108: intersect F4_tool104
    add(f4_tool104.part, mode=Mode.INTERSECT)


with BuildPart() as f1_14:
    add(f1_13.part)

    # F4_t98: cut F4_tool100
    add(f4_tool100_1.part, mode=Mode.SUBTRACT)


with BuildPart() as f4_tool111:
    # F4_s112 → F4_t113 (new body)
    with BuildSketch(Plane.YZ.offset(-5.08)):
        with BuildLine():
            ThreePointArc((6.9250832465, 20.32), (10.5171856949, 18.8321024484), (12.0050832465, 15.24))
            Line((12.0050832465, 15.24), (12.0050832465, 20.32))
            Line((12.0050832465, 20.32), (6.9250832465, 20.32))
        make_face()
    extrude(amount=-F4_T113_DEPTH)

    split(bisect_by=Plane.YZ.offset(-63.5), keep=Keep.BOTTOM)


with BuildPart() as f4_tool115:
    # F4_s116 → F4_t117 (new body)
    with BuildSketch(Plane.XZ.offset(0.6949167535)):
        with BuildLine():
            ThreePointArc((-68.58, 20.32), (-64.9878975516, 18.8321024484), (-63.5, 15.24))
            Line((-63.5, 15.24), (-63.5, 20.32))
            Line((-63.5, 20.32), (-68.58, 20.32))
        make_face()
    extrude(amount=-F4_T117_DEPTH)

    split(bisect_by=Plane.XZ.offset(-12.0050832465), keep=Keep.TOP)


with BuildPart() as f4_tool111_1:
    add(f4_tool111.part)

    # F4_t119: intersect F4_tool115
    add(f4_tool115.part, mode=Mode.INTERSECT)


with BuildPart() as f1_15:
    add(f1_14.part)

    # F4_t109: cut F4_tool111
    add(f4_tool111_1.part, mode=Mode.SUBTRACT)


with BuildPart() as f4_tool122:
    # F4_s123 → F4_t124 (new body)
    with BuildSketch(Plane.YZ.offset(-5.08)):
        with BuildLine():
            ThreePointArc((6.9250832465, 0), (10.5171856949, 1.4878975516), (12.0050832465, 5.08))
            Line((12.0050832465, 5.08), (12.0050832465, 0))
            Line((12.0050832465, 0), (6.9250832465, 0))
        make_face()
    extrude(amount=-F4_T124_DEPTH)

    split(bisect_by=Plane.YZ.offset(-63.5), keep=Keep.BOTTOM)


with BuildPart() as f4_tool126:
    # F4_s127 → F4_t128 (new body)
    with BuildSketch(Plane.XZ.offset(0.6949167535)):
        with BuildLine():
            ThreePointArc((-68.58, 0), (-64.9878975516, 1.4878975516), (-63.5, 5.08))
            Line((-63.5, 5.08), (-63.5, 0))
            Line((-63.5, 0), (-68.58, 0))
        make_face()
    extrude(amount=-F4_T128_DEPTH)

    split(bisect_by=Plane.XZ.offset(-12.0050832465), keep=Keep.TOP)


with BuildPart() as f4_tool122_1:
    add(f4_tool122.part)

    # F4_t130: intersect F4_tool126
    add(f4_tool126.part, mode=Mode.INTERSECT)


with BuildPart() as f1_16:
    add(f1_15.part)

    # F4_t120: cut F4_tool122
    add(f4_tool122_1.part, mode=Mode.SUBTRACT)


solid = f1_16.part
